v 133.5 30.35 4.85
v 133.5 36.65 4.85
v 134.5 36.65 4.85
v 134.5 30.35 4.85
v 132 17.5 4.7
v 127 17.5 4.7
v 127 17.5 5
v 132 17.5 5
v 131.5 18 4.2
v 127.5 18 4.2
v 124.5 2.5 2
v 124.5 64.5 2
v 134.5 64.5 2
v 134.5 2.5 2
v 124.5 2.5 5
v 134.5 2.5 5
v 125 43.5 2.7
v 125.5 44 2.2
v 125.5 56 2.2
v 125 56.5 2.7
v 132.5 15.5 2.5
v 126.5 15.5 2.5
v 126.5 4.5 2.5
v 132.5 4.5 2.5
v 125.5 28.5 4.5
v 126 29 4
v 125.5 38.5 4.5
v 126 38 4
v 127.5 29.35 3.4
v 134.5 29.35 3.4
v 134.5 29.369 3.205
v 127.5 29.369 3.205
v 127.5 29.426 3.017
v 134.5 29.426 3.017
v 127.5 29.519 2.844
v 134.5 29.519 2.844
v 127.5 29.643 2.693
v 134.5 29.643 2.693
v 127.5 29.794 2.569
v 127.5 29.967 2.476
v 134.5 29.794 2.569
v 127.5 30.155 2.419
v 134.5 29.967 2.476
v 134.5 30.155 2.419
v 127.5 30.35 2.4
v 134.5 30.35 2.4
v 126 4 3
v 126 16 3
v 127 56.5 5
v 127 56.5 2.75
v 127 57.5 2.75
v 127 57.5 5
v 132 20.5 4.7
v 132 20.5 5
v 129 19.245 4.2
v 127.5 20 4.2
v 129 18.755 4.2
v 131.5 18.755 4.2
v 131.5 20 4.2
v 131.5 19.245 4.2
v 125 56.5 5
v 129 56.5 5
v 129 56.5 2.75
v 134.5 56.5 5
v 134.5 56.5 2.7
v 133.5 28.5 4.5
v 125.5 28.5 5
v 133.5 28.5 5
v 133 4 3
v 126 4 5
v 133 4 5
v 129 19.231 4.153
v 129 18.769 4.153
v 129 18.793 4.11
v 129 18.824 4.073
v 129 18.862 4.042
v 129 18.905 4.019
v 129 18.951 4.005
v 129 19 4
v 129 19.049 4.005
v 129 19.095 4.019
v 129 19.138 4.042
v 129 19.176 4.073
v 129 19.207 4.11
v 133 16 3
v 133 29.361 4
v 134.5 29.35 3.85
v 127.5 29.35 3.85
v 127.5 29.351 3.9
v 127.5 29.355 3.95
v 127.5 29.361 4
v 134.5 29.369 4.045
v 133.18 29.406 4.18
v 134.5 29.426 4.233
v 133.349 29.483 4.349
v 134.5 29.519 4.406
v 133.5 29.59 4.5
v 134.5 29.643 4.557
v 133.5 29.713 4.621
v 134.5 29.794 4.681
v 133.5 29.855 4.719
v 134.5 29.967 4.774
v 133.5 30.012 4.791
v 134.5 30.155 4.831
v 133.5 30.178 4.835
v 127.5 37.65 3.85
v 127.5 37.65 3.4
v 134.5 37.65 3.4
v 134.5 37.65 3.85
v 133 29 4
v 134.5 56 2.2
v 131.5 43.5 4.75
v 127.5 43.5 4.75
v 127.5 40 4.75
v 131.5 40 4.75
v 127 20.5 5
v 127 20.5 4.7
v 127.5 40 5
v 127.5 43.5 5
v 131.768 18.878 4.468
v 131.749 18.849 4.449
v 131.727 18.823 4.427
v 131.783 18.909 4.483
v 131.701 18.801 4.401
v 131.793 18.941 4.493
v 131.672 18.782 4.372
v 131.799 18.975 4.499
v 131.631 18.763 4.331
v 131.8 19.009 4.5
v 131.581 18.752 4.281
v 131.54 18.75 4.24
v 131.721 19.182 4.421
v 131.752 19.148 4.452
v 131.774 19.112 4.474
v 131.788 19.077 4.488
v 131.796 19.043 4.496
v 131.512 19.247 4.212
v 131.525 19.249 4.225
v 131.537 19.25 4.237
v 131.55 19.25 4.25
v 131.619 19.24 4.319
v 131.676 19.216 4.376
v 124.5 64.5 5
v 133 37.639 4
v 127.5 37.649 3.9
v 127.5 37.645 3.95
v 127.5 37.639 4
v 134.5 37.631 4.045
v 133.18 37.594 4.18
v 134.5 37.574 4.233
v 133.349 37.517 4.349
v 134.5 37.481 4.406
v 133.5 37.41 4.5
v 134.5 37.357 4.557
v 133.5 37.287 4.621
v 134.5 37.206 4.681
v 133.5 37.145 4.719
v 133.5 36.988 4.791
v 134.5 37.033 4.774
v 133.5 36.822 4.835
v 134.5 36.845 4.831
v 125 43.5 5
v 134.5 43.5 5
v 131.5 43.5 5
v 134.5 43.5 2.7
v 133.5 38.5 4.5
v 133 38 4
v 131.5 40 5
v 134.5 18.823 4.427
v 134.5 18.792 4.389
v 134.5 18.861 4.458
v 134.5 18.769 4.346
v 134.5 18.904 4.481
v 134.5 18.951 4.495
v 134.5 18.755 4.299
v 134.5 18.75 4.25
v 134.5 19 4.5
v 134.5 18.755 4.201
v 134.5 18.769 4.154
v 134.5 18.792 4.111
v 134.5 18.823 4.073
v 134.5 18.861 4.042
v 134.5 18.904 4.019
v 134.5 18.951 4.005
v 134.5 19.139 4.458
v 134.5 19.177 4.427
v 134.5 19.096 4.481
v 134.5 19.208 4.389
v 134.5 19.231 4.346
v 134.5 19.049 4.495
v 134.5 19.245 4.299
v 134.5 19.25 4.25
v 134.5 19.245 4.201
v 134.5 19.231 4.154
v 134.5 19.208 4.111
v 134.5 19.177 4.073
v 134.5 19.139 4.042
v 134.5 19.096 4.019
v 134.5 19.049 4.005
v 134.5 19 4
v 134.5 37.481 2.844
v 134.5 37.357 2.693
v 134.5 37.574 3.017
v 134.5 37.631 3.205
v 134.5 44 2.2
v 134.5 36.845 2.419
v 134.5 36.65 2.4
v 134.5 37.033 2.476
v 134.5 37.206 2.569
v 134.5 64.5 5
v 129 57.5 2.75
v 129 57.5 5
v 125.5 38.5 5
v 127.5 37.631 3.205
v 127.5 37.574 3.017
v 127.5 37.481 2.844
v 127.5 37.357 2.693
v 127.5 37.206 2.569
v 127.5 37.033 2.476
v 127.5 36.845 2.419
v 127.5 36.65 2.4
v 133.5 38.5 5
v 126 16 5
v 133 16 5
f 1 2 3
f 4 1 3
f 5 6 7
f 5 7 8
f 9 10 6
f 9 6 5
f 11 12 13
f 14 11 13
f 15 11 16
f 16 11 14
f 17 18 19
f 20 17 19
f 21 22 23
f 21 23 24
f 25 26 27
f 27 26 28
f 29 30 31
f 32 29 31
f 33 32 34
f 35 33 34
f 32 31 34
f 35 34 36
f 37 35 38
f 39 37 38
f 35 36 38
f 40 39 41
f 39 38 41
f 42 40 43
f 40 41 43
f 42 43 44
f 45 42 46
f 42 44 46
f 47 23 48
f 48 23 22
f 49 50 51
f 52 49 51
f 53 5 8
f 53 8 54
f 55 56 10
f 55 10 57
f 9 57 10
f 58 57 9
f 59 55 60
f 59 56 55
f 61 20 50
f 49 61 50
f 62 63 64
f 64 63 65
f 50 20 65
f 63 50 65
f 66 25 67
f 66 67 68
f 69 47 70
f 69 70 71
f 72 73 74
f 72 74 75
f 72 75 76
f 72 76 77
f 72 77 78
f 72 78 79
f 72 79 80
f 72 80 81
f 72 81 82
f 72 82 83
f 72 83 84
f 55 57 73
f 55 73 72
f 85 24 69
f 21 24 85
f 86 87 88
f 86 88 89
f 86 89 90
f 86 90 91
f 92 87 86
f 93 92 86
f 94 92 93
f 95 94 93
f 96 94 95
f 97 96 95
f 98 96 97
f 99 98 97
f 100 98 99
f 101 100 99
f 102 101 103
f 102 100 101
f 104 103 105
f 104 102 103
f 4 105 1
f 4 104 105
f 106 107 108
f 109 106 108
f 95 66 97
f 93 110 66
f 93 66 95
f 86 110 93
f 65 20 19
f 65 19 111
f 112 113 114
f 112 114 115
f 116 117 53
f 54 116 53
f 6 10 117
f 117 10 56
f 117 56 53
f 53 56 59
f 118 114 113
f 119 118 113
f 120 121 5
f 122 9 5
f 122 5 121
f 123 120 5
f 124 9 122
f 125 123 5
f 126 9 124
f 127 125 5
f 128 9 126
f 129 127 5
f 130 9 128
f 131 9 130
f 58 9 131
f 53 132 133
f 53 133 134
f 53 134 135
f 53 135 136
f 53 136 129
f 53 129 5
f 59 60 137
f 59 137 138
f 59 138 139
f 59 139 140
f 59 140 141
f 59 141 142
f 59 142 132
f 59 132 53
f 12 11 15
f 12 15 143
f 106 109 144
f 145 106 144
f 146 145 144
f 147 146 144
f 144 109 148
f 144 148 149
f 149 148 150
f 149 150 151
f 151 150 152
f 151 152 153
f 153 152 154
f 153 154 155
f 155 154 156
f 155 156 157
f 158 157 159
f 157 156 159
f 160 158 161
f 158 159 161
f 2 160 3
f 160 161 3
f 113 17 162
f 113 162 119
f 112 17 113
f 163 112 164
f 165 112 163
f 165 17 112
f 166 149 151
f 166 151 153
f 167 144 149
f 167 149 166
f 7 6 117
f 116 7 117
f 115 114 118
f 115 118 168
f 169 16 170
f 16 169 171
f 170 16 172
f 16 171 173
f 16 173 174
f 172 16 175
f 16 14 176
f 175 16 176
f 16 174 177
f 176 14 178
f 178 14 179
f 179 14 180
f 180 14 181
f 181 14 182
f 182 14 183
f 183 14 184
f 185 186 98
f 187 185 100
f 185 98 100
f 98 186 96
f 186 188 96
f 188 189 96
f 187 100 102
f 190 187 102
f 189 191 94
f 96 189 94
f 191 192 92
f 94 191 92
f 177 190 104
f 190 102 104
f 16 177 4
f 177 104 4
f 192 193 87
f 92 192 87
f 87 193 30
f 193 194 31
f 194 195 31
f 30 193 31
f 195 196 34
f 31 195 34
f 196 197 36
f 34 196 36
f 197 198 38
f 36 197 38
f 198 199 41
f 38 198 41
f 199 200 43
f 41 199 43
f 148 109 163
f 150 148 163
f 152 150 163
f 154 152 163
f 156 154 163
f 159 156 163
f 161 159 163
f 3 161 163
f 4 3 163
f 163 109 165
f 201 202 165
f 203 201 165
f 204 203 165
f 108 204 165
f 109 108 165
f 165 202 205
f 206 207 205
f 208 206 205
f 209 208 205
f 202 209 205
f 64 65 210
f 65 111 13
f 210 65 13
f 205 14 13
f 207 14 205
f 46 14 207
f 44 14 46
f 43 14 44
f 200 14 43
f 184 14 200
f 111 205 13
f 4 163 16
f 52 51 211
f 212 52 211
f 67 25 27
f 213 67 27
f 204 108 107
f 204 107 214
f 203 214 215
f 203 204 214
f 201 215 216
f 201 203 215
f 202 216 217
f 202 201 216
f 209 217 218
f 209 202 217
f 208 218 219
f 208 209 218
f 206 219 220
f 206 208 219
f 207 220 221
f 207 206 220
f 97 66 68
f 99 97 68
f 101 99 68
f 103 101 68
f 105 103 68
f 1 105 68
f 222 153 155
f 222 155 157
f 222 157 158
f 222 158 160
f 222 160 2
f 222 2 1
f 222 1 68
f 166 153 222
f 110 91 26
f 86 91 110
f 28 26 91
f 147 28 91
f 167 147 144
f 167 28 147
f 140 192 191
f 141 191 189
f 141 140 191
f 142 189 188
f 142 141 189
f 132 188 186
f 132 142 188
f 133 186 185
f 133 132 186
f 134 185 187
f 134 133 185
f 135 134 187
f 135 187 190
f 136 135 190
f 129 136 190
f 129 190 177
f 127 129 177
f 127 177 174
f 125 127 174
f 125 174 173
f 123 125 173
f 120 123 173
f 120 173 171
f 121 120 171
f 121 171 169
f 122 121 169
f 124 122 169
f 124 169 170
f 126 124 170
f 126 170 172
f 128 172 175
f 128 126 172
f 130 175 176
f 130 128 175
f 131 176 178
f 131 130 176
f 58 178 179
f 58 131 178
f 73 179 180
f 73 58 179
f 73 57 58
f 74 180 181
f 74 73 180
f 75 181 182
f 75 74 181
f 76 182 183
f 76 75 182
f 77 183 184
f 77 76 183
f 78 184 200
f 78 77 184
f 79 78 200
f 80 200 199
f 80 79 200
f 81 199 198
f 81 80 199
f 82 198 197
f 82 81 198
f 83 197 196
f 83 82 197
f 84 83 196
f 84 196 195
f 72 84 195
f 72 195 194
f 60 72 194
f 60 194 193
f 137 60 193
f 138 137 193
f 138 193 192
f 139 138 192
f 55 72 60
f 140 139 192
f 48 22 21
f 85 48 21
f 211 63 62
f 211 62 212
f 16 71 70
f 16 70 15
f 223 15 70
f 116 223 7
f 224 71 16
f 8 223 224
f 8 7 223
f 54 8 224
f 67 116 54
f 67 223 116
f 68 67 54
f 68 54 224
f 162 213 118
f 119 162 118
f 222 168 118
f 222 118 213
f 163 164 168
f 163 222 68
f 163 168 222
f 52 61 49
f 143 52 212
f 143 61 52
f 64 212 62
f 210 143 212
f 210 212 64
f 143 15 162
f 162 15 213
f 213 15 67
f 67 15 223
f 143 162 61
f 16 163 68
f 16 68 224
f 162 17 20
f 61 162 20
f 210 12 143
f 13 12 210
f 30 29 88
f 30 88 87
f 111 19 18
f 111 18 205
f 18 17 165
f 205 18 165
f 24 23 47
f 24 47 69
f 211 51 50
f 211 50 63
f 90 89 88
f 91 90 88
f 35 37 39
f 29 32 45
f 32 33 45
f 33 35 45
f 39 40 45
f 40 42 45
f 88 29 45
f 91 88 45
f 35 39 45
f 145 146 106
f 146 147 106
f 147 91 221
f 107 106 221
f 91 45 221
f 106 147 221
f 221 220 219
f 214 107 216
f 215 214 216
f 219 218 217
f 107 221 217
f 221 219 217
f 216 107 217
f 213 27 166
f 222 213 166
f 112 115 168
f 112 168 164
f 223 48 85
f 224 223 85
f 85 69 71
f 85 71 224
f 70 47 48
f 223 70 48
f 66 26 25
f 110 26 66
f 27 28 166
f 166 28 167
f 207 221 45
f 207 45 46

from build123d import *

# Parameters (mm, degrees)
BOX038_W          = 4
BOX038_H          = 4
BOX038_DEPTH      = 10
BOX037_W          = 3
BOX037_H          = 6
BOX037_DEPTH      = 10
BOX036_W          = 2
BOX036_H          = 2.5
BOX036_DEPTH      = 10
BOX027_W          = 8.65
BOX027_H          = 8.3
BOX027_DEPTH      = 2.45
FILLET016_R       = 1
BOX034_W          = 7
BOX034_H          = 12
BOX034_DEPTH      = 3
CHAMFER002_SIZE   = 0.5
BOX033_W          = 8
BOX033_H          = 10
BOX033_DEPTH      = 10
CHAMFER001_SIZE   = 0.5
BOX032_W          = 5
BOX032_H          = 3
BOX032_DEPTH      = 10
CHAMFER_SIZE      = 0.5
BOX024_W          = 8.65
BOX024_H          = 8.3
BOX024_DEPTH      = 2.45
FILLET015_R       = 1
CYLINDER028_R     = 0.25
CYLINDER028_DEPTH = 10
BOX026_W          = 10
BOX026_H          = 13
BOX026_DEPTH      = 3
BOX014_W          = 10
BOX014_H          = 62
BOX014_DEPTH      = 3
CHAMFER003_SIZE   = 0.5


with BuildPart() as cubo032:
    # Box038 → Box038 (new body)
    with BuildSketch(Plane(origin=(127.5, 40, 4.75), x_dir=(1, 0, 0), z_dir=(0, 0, 1))):
        with Locations((2, 2)):
            Rectangle(BOX038_W, BOX038_H)
    extrude(amount=BOX038_DEPTH)


with BuildPart() as cubo031:
    # Box037 → Box037 (new body)
    with BuildSketch(Plane(origin=(128, 41, 4.75), x_dir=(1, 0, 0), z_dir=(0, 0, 1))):
        with Locations((1.5, 3)):
            Rectangle(BOX037_W, BOX037_H)
    extrude(amount=BOX037_DEPTH)


with BuildPart() as cubo030:
    # Box036 → Box036 (new body)
    with BuildSketch(Plane(origin=(127, 55, 2.75), x_dir=(1, 0, 0), z_dir=(0, 0, 1))):
        with Locations((1, 1.25)):
            Rectangle(BOX036_W, BOX036_H)
    extrude(amount=BOX036_DEPTH)


with BuildPart() as usb_c002:
    # Box027 → Box027 (new body)
    with BuildSketch(Plane.XY):
        with Locations((4.325, 4.15)):
            Rectangle(BOX027_W, BOX027_H)
    extrude(amount=BOX027_DEPTH)

    # Fillet016
    fillet016_edges = [usb_c002.edges().sort_by_distance(p)[0] for p in [
        (4.325, 0, 0),
        (4.325, 0, 2.45),
        (4.325, 8.3, 0),
        (4.325, 8.3, 2.45),
    ]]
    fillet(fillet016_edges, radius=FILLET016_R)


with BuildPart() as usb_c002_1:
    # Fillet016 placement: moved
    add(usb_c002.part.moved(Location((127.5, 29.35, 2.4))))


with BuildPart() as chamfer002:
    # Box034 → Box034 (new body)
    with BuildSketch(Plane(origin=(126, 4, 2.5), x_dir=(1, 0, 0), z_dir=(0, 0, 1))):
        with Locations((3.5, 6)):
            Rectangle(BOX034_W, BOX034_H)
    extrude(amount=BOX034_DEPTH)

    # Chamfer002
    chamfer002_edges = [chamfer002.edges().sort_by_distance(p)[0] for p in [
        (126, 10, 2.5),
        (133, 10, 2.5),
        (129.5, 4, 2.5),
        (129.5, 16, 2.5),
    ]]
    chamfer(chamfer002_edges, length=CHAMFER002_SIZE)


with BuildPart() as chamfer001:
    # Box033 → Box033 (new body)
    with BuildSketch(Plane(origin=(124, 28.5, 0), x_dir=(1, 0, 0), z_dir=(0, 0, 1))):
        with Locations((4, 5)):
            Rectangle(BOX033_W, BOX033_H)
    extrude(amount=BOX033_DEPTH)

    # Chamfer001
    chamfer001_edges = [chamfer001.edges().sort_by_distance(p)[0] for p in [
        (124, 33.5, 0),
        (132, 33.5, 0),
        (128, 28.5, 0),
        (128, 38.5, 0),
    ]]
    chamfer(chamfer001_edges, length=CHAMFER001_SIZE)


with BuildPart() as chamfer001_1:
    # Chamfer001 placement: moved
    add(chamfer001.part.moved(Location((1.5, 0, 4))))


with BuildPart() as chamfer_body:
    # Box032 → Box032 (new body)
    with BuildSketch(Plane(origin=(124, 14, 0), x_dir=(1, 0, 0), z_dir=(0, 0, 1))):
        with Locations((2.5, 1.5)):
            Rectangle(BOX032_W, BOX032_H)
    extrude(amount=BOX032_DEPTH)

    # Chamfer
    chamfer_edges = [chamfer_body.edges().sort_by_distance(p)[0] for p in [
        (124, 15.5, 0),
        (129, 15.5, 0),
        (126.5, 14, 0),
        (126.5, 17, 0),
    ]]
    chamfer(chamfer_edges, length=CHAMFER_SIZE)


with BuildPart() as chamfer_body_1:
    # Chamfer placement: moved
    add(chamfer_body.part.moved(Location((3, 3.5, 4.2))))


with BuildPart() as usb_c001:
    # Box024 → Box024 (new body)
    with BuildSketch(Plane.XY):
        with Locations((4.325, 4.15)):
            Rectangle(BOX024_W, BOX024_H)
    extrude(amount=BOX024_DEPTH)

    # Fillet015
    fillet015_edges = [usb_c001.edges().sort_by_distance(p)[0] for p in [
        (4.325, 0, 0),
        (4.325, 0, 2.45),
        (4.325, 8.3, 0),
        (4.325, 8.3, 2.45),
    ]]
    fillet(fillet015_edges, radius=FILLET015_R)


with BuildPart() as usb_c001_1:
    # Fillet015 placement: moved
    add(usb_c001.part.moved(Location((130, 29.35, 2.4))))


with BuildPart() as cilindro026:
    # Cylinder028 → Cylinder028 (new body)
    with BuildSketch(Plane(origin=(129, 19, 4.25), x_dir=(0, 1, 0), z_dir=(1, 0, 0))):
        Circle(CYLINDER028_R)
    extrude(amount=CYLINDER028_DEPTH)


with BuildPart() as agujero_altavoz:
    # Box026 → Box026 (new body)
    with BuildSketch(Plane(origin=(125, 43.5, 2.2), x_dir=(1, 0, 0), z_dir=(0, 0, 1))):
        with Locations((5, 6.5)):
            Rectangle(BOX026_W, BOX026_H)
    extrude(amount=BOX026_DEPTH)


with BuildPart() as cut044:
    # Box014 → Box014 (new body)
    with BuildSketch(Plane(origin=(124.5, 2.5, 2), x_dir=(1, 0, 0), z_dir=(0, 0, 1))):
        with Locations((5, 31)):
            Rectangle(BOX014_W, BOX014_H)
    extrude(amount=BOX014_DEPTH)

    # Cut030: cut Agujero Altavoz
    add(agujero_altavoz.part, mode=Mode.SUBTRACT)

    # Cut032: cut Cilindro026
    add(cilindro026.part, mode=Mode.SUBTRACT)

    # Cut033: cut USB-C001
    add(usb_c001_1.part, mode=Mode.SUBTRACT)

    # Cut038: cut Chamfer body
    add(chamfer_body_1.part, mode=Mode.SUBTRACT)

    # Cut039: cut Chamfer001
    add(chamfer001_1.part, mode=Mode.SUBTRACT)

    # Cut040: cut Chamfer002
    add(chamfer002.part, mode=Mode.SUBTRACT)

    # Cut041: cut USB-C002
    add(usb_c002_1.part, mode=Mode.SUBTRACT)

    # Chamfer003
    chamfer003_edges = [cut044.edges().sort_by_distance(p)[0] for p in [
        (129.75, 56.5, 2.2),
        (125, 50, 2.2),
        (129.75, 43.5, 2.2),
    ]]
    chamfer(chamfer003_edges, length=CHAMFER003_SIZE)

    # Cut042: cut Cubo030
    add(cubo030.part, mode=Mode.SUBTRACT)

    # Cut043: cut Cubo031
    add(cubo031.part, mode=Mode.SUBTRACT)

    # Cut044: cut Cubo032
    add(cubo032.part, mode=Mode.SUBTRACT)


solid = cut044.part
